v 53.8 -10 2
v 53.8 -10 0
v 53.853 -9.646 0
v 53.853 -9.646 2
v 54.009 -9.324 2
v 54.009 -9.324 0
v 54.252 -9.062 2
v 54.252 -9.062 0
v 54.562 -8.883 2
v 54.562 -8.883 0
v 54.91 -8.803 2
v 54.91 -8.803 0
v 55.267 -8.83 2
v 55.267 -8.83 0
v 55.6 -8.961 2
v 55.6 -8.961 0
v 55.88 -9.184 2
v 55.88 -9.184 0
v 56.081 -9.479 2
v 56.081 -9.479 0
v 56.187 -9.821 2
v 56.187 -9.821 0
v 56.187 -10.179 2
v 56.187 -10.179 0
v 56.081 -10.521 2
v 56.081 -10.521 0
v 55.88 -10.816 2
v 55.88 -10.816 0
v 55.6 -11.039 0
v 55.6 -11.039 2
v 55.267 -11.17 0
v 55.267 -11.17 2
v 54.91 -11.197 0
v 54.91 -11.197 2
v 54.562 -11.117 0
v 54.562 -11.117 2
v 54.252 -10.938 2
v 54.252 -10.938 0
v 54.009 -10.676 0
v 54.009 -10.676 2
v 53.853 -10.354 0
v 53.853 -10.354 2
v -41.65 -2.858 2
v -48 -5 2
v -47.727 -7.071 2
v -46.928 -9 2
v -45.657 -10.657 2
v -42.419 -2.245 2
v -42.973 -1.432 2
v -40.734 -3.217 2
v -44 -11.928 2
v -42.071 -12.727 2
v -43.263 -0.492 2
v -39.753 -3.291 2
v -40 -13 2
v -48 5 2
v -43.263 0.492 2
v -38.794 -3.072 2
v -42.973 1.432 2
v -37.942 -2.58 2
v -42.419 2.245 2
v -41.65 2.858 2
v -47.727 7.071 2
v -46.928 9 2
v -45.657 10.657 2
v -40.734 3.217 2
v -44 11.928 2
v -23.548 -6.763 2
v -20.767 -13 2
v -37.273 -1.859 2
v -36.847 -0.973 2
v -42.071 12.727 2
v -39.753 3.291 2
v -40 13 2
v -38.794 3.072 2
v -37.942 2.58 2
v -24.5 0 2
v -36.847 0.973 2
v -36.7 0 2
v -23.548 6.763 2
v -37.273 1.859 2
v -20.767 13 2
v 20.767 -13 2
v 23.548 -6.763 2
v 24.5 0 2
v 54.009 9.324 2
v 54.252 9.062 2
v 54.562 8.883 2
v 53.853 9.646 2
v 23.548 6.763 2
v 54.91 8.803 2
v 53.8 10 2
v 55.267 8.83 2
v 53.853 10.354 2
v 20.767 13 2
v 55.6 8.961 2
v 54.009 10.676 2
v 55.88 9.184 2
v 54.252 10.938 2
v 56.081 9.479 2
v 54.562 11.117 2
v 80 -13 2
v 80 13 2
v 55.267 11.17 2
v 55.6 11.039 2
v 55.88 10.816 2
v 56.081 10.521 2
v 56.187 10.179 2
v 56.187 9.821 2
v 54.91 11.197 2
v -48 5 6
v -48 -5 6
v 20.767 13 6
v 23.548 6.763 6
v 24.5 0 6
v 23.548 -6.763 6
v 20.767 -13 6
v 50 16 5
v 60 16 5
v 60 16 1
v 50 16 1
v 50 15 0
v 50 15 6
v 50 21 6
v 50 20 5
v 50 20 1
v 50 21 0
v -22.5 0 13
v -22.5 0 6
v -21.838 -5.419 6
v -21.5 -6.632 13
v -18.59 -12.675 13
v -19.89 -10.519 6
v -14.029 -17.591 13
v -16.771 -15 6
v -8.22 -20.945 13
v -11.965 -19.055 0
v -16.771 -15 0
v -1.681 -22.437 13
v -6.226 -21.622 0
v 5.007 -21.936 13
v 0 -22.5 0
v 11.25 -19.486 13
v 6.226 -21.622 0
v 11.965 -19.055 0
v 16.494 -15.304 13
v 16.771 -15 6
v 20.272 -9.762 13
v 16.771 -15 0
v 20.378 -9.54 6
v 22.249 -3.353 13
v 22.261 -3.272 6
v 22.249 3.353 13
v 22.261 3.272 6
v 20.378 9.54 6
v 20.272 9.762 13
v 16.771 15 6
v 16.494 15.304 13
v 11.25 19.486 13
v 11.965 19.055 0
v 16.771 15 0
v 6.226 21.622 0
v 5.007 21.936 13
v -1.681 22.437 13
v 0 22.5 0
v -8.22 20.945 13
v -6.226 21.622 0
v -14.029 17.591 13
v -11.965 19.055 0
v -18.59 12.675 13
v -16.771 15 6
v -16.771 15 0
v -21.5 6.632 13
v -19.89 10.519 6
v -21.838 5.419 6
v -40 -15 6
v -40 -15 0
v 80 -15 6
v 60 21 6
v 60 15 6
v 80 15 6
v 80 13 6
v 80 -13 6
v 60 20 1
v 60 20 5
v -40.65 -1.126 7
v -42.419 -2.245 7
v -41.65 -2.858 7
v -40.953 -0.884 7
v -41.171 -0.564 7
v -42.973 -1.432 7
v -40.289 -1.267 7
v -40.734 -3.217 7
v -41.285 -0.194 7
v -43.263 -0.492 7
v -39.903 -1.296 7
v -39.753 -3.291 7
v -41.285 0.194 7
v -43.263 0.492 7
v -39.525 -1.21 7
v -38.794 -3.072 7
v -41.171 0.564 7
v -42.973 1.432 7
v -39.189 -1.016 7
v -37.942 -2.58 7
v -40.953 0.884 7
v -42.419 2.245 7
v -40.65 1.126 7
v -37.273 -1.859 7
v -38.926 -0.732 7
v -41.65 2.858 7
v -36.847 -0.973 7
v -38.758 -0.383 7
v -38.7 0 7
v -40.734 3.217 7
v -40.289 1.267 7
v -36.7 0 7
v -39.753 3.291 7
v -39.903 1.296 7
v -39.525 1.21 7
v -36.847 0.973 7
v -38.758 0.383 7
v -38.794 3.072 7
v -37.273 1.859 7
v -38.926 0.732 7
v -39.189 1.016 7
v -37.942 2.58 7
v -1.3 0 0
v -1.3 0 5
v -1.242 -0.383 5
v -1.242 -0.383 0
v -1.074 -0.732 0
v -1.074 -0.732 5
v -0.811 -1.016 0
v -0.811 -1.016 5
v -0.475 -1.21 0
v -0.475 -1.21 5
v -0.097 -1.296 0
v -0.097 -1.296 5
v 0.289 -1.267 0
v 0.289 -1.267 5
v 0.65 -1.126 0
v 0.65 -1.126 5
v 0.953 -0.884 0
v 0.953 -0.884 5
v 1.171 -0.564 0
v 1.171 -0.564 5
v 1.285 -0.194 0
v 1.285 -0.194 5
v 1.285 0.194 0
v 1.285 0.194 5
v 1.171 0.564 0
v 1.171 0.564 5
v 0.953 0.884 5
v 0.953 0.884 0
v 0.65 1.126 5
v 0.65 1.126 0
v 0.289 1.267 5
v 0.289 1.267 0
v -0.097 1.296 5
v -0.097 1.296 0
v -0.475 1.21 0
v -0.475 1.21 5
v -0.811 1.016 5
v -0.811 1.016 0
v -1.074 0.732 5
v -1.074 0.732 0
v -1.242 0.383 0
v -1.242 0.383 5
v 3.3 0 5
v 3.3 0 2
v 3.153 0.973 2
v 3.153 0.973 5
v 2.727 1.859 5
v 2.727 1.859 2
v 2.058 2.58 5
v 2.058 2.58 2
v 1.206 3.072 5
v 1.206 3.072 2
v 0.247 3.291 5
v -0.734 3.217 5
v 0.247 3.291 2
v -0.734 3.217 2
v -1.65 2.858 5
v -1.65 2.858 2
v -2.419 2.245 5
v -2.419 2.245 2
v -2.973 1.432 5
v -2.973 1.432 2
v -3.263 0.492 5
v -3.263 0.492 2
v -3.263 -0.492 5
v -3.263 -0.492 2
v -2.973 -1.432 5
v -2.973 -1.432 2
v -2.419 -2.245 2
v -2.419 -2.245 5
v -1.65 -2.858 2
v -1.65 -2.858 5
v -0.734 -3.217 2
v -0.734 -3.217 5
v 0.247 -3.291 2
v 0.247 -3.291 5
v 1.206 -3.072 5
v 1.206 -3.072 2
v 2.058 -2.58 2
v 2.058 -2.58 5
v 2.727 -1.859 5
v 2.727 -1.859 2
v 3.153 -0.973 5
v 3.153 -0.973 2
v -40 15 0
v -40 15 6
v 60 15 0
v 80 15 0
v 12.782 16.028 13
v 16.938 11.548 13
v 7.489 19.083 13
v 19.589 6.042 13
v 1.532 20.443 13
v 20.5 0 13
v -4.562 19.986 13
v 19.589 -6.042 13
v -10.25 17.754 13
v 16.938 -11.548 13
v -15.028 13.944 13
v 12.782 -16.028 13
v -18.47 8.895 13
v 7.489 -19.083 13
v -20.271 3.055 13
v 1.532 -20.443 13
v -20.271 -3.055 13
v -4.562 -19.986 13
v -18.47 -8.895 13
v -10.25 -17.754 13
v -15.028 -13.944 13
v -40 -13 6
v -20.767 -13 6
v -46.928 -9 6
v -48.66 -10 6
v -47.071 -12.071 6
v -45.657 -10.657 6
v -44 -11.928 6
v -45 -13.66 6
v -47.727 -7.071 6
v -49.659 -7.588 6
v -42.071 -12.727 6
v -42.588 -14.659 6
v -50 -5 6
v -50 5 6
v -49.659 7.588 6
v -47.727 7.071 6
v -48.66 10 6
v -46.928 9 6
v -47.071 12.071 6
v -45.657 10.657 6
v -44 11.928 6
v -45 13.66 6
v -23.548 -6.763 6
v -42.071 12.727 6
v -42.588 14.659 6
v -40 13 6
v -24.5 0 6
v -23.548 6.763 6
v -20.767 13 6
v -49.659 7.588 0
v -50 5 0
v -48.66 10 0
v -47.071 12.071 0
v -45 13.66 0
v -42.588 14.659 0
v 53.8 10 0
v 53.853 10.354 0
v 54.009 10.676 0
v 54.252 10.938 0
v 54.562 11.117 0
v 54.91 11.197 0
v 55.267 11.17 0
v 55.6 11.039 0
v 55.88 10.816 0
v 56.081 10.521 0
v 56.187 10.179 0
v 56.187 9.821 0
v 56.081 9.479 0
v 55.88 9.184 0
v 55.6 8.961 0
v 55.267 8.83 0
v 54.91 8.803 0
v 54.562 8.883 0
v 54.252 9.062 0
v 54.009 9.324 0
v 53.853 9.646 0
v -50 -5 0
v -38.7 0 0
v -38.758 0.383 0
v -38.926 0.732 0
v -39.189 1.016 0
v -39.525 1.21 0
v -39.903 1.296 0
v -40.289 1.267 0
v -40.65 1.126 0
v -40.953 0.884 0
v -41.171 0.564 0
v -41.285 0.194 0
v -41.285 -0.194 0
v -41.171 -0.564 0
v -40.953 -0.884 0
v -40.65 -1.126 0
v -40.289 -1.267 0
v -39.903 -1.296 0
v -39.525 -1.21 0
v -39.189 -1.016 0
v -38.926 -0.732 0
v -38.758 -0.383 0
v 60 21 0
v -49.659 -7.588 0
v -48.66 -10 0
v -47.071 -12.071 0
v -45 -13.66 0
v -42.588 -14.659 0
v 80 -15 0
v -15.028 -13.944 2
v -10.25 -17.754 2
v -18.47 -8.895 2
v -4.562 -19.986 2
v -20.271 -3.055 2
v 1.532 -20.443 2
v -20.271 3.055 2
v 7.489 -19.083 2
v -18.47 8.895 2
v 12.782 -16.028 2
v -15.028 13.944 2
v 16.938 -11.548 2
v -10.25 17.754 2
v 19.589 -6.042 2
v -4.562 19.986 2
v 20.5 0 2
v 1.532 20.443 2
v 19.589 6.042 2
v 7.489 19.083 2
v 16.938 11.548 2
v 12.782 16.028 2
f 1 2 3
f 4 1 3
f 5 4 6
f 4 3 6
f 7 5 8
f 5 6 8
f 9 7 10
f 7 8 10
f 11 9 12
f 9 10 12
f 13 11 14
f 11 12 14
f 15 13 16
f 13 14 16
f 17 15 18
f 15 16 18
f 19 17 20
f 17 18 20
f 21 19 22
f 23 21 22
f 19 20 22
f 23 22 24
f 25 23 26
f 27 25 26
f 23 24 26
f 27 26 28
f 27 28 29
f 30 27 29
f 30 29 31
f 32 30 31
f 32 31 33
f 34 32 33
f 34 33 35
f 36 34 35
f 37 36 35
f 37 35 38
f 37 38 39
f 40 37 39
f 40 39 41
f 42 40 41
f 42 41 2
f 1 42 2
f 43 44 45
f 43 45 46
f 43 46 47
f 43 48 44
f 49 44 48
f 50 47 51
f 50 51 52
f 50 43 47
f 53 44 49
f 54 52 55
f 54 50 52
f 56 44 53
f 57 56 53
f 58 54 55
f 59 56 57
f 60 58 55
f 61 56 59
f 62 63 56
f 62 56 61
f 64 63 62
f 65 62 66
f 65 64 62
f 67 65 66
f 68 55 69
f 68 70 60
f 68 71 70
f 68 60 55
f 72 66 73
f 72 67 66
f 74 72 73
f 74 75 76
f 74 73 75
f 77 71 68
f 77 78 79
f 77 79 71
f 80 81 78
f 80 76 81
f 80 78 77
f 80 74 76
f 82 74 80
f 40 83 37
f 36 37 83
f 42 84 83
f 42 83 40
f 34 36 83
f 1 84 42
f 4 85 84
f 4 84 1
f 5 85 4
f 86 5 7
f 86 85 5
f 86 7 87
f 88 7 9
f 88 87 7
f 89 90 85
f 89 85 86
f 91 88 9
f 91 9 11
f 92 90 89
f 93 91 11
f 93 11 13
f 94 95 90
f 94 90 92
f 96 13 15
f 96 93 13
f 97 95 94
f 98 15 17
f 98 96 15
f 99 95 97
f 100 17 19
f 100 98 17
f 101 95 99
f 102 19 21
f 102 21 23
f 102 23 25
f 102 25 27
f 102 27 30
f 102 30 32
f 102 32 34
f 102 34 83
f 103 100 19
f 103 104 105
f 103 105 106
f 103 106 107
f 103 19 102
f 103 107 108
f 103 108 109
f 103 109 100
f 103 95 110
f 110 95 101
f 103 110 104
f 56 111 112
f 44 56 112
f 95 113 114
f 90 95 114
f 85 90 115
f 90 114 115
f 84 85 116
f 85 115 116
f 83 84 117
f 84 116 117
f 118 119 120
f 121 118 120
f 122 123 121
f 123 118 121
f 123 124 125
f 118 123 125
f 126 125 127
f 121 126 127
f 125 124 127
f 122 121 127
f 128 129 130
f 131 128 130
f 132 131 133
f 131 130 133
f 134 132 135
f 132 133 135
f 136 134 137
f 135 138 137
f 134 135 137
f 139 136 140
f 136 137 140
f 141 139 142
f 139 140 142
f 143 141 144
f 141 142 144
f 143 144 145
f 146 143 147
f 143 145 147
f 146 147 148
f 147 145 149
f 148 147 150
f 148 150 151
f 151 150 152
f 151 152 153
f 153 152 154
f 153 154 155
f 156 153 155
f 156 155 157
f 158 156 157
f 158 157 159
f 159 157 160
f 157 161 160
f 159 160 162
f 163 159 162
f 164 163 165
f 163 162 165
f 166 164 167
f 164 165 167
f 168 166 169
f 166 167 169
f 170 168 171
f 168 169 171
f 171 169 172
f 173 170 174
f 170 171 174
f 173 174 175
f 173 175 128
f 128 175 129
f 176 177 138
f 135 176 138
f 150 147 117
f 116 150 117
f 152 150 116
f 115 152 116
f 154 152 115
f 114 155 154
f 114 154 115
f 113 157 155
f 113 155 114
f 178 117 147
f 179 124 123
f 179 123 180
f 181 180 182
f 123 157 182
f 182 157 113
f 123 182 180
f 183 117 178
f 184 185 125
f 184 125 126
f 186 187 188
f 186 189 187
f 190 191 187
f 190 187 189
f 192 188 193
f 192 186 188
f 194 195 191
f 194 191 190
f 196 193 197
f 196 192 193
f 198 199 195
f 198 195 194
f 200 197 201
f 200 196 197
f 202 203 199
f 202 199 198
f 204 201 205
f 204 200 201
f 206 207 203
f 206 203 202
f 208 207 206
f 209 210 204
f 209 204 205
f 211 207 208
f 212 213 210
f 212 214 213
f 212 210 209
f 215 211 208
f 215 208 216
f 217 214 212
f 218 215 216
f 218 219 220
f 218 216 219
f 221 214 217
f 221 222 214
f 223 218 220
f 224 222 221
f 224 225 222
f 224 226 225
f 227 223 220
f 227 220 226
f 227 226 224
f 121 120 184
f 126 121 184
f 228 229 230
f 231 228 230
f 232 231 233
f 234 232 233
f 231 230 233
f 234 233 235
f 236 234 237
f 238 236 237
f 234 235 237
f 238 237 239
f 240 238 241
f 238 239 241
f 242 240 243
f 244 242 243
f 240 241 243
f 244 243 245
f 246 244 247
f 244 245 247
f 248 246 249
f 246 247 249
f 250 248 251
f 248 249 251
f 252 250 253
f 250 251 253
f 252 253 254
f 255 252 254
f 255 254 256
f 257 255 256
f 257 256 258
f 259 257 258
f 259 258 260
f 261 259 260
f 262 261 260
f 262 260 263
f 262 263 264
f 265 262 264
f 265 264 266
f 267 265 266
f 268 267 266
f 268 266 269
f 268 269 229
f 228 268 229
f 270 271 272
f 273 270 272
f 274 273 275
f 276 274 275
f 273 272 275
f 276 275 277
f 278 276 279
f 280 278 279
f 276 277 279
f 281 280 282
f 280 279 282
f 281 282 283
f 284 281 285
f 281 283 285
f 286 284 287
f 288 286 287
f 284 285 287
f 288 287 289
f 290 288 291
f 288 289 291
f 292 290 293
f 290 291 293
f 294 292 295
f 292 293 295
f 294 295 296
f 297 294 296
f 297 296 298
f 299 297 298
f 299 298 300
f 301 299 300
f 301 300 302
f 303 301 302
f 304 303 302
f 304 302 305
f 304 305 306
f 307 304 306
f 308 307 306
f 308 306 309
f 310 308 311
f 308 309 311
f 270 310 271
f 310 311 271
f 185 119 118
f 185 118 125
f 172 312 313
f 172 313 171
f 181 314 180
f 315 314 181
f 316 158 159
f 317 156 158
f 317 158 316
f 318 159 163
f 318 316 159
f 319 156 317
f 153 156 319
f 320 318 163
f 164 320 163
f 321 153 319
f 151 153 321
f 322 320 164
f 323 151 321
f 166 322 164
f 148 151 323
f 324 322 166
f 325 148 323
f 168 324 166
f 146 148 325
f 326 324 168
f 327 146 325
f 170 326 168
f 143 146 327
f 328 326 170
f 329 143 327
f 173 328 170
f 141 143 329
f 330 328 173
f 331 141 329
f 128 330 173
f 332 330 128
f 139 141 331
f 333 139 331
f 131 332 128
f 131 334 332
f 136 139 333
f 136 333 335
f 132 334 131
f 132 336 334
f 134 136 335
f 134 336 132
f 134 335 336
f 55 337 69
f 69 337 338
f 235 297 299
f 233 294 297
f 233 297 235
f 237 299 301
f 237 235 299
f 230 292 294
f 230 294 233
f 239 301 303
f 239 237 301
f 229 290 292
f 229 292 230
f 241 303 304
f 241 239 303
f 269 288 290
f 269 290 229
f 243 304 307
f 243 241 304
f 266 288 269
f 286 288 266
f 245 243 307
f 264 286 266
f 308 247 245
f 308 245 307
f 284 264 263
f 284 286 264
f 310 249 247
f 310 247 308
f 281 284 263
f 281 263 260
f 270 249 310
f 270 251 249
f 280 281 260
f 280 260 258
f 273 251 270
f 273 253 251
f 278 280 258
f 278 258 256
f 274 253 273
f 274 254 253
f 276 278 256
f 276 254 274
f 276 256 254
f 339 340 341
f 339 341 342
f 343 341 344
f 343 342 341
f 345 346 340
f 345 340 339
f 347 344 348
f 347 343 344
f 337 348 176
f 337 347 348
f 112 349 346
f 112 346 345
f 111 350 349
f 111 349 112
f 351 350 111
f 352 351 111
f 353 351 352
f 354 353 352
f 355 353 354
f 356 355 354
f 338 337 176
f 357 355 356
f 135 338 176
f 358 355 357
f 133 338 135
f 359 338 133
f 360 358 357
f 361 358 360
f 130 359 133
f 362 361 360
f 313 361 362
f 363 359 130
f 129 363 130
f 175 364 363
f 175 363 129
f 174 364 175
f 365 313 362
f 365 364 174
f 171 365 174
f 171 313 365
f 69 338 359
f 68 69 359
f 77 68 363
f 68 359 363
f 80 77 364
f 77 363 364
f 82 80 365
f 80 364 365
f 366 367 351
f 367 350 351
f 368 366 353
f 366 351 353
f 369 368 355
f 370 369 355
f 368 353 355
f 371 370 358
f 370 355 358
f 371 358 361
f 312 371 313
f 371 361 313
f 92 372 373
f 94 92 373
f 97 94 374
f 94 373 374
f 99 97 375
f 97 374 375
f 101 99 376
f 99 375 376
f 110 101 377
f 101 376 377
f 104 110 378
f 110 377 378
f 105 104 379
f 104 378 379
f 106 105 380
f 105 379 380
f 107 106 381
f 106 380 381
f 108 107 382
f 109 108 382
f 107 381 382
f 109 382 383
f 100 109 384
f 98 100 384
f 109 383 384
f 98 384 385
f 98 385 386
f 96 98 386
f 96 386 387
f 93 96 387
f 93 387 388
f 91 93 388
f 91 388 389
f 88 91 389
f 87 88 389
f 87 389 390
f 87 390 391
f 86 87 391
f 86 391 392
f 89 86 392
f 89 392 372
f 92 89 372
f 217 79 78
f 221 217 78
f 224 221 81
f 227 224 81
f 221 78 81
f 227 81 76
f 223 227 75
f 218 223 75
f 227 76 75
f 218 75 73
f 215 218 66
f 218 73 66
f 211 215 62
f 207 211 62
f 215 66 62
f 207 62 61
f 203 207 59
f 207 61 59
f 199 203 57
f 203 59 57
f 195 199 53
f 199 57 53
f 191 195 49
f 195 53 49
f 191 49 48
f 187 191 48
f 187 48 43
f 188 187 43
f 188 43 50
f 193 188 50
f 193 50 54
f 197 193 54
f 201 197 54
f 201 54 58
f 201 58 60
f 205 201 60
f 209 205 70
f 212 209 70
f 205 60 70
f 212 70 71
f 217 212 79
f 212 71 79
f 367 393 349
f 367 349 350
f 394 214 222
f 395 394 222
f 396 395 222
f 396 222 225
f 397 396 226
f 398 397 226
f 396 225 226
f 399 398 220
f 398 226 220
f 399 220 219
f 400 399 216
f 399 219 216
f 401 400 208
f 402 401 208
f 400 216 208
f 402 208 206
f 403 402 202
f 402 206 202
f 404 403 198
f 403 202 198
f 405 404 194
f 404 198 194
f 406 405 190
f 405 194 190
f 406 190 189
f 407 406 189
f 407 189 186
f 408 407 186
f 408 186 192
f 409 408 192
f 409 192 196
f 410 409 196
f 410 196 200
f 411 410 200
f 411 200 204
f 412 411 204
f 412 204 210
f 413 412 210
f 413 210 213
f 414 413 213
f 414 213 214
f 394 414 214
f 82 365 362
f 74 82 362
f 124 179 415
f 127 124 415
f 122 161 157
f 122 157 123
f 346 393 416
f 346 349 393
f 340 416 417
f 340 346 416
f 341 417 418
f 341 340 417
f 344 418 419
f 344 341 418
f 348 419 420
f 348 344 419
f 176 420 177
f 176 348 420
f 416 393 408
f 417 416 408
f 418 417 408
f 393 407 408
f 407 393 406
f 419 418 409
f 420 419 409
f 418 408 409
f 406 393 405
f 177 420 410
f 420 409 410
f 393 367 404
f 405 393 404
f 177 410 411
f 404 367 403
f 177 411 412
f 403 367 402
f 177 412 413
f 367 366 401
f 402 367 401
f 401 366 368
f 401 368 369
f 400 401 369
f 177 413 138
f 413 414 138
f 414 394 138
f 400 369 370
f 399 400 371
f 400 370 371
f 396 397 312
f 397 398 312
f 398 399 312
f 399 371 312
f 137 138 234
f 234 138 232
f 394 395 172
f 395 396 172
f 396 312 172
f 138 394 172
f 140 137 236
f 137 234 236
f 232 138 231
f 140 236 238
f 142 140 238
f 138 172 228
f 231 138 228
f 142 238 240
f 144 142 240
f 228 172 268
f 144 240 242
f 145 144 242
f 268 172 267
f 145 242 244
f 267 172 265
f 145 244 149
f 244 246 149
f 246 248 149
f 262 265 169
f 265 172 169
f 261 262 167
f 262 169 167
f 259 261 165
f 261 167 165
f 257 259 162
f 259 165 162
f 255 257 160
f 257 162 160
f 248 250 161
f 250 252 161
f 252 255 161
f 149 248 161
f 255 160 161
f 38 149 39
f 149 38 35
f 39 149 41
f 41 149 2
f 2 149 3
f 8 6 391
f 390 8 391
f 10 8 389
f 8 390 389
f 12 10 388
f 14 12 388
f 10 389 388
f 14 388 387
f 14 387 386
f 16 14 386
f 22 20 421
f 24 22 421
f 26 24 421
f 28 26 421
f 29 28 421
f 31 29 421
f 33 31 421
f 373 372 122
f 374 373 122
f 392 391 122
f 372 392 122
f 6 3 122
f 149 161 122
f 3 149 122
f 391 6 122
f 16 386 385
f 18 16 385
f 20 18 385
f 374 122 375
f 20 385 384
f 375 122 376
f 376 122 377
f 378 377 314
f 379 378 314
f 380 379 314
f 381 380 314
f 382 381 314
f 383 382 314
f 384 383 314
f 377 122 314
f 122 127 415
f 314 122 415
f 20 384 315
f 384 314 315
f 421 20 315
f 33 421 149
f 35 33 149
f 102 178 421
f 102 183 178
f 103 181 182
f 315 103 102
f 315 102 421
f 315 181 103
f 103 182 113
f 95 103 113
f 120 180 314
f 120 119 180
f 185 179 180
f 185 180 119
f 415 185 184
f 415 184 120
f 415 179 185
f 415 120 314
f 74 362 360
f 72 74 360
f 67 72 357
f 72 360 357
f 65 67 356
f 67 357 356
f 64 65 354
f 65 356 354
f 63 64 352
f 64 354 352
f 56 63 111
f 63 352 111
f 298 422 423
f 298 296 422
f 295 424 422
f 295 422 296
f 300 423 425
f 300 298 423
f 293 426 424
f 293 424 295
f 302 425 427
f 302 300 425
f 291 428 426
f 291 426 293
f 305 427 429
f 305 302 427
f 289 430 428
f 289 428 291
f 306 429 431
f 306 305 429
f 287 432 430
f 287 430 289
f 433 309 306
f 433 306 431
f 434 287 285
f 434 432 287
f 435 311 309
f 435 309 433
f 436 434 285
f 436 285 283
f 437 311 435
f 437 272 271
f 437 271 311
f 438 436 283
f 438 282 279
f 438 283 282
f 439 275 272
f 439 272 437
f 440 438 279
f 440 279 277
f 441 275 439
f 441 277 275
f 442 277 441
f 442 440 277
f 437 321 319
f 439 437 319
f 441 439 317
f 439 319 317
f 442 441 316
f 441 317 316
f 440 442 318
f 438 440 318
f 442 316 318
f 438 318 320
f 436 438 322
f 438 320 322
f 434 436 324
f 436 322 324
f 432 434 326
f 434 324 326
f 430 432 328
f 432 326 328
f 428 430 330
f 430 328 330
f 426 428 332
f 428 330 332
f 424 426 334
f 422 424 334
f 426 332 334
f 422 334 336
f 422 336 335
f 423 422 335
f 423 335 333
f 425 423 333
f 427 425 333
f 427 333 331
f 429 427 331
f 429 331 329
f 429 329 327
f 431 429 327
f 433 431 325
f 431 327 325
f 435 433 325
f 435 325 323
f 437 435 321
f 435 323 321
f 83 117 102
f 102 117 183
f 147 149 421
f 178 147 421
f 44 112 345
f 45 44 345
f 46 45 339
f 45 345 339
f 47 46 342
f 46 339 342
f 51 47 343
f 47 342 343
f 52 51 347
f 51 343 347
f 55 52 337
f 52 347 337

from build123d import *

# Parameters (mm, degrees)
SZKIC1_R                    = 22.5
DODANIE_WYCI_GNI_CIE2_DEPTH = 13
SZKIC2_W                    = 220
SZKIC2_H                    = 30
DODANIE_WYCI_GNI_CIE3_DEPTH = 6
ZAOKR_GLENIE1_R             = 10
SZKIC4_R                    = 20.5
WYTNIJ_WYCI_GNI_CIE3_DEPTH  = 11
WYTNIJ_WYCI_GNI_CIE2_DEPTH  = 4
WYTNIJ_WYCI_GNI_CIE4_REACH  = 173.975
SZKIC8_W                    = 23
SZKIC8_H                    = 14
SZKIC12_R                   = 3.3
DODANIE_WYCI_GNI_CIE4_DEPTH = 3
OTW_R_POD_RUB_M21_D         = 2.6
OTW_R_POD_RUB_M23_D         = 2.6
SZKIC14_R                   = 3.3
DODANIE_WYCI_GNI_CIE5_DEPTH = 5
OTW_R_POD_RUB_M24_D         = 2.6
SZKIC15_W                   = 6
SZKIC15_H                   = 6
SZKIC15_W_2                 = 4
SZKIC15_H_2                 = 4
DODANIE_WYCI_GNI_CIE6_DEPTH = 10
SZYK_LINIOWY1_COUNT         = 2
SZYK_LINIOWY1_PITCH         = 70
OTW_R_POD_RUB_M25_D         = 2.4


with BuildPart() as part:
    # Szkic1 → Dodanie-wyciągnięcie2 (new body)
    with BuildSketch(Plane.XY):
        with Locations(Location((0, 0, 0), (0, 0, 180))):
            Circle(SZKIC1_R)
    extrude(amount=DODANIE_WYCI_GNI_CIE2_DEPTH)

    # Szkic2 → Dodanie-wyciągnięcie3 (add)
    with BuildSketch(Plane.XY):
        with Locations((60, 0)):
            Rectangle(SZKIC2_W, SZKIC2_H)
    extrude(amount=DODANIE_WYCI_GNI_CIE3_DEPTH)

    # Zaokrąglenie1
    zaokr_glenie1_edges = [part.edges().sort_by_distance(p)[0] for p in [
        (170, 15, 3),
        (-50, -15, 3),
        (170, -15, 3),
        (-50, 15, 3),
    ]]
    fillet(zaokr_glenie1_edges, radius=ZAOKR_GLENIE1_R)

    # Szkic4 → Wytnij-wyciągnięcie3 (cut)
    with BuildSketch(Plane.XY.offset(13)):
        Circle(SZKIC4_R)
    extrude(amount=-WYTNIJ_WYCI_GNI_CIE3_DEPTH, mode=Mode.SUBTRACT)

    # Szkic3 → Wytnij-wyciągnięcie2 (cut)
    with BuildSketch(Plane.XY.offset(6)):
        with BuildLine():
            Line((168, -5), (168, 5))
            ThreePointArc((168, 5), (165.656854249, 10.656854249), (160, 13))
            Line((160, 13), (20.766559657, 13))
            ThreePointArc((20.766559657, 13), (24.5, 0), (20.766559657, -13))
            Line((20.766559657, -13), (160, -13))
            ThreePointArc((160, -13), (165.656854249, -10.656854249), (168, -5))
        make_face()
        with BuildLine():
            Line((-48, 5), (-48, -5))
            ThreePointArc((-48, -5), (-45.656854249, -10.656854249), (-40, -13))
            Line((-40, -13), (-20.766559657, -13))
            ThreePointArc((-20.766559657, -13), (-24.5, 0), (-20.766559657, 13))
            Line((-20.766559657, 13), (-40, 13))
            ThreePointArc((-40, 13), (-45.656854249, 10.656854249), (-48, 5))
        make_face()
    extrude(amount=-WYTNIJ_WYCI_GNI_CIE2_DEPTH, mode=Mode.SUBTRACT)

    # Szkic8 → Wytnij-wyciągnięcie4 (cut, up to next)
    with BuildSketch(Plane.XY, mode=Mode.PRIVATE) as wytnij_wyci_gni_cie4_sk1:
        with Locations((150, 0)):
            Rectangle(SZKIC8_W, SZKIC8_H)
    wytnij_wyci_gni_cie4_tool1 = extrude(wytnij_wyci_gni_cie4_sk1.sketch, amount=WYTNIJ_WYCI_GNI_CIE4_REACH, mode=Mode.PRIVATE) & part.part
    add(wytnij_wyci_gni_cie4_tool1.solids().sort_by_distance((150, 0, 0))[0], mode=Mode.SUBTRACT)

    # Szkic12 → Dodanie-wyciągnięcie4 (add)
    with BuildSketch(Plane.XY.offset(2)):
        Circle(SZKIC12_R)
    extrude(amount=DODANIE_WYCI_GNI_CIE4_DEPTH)

    # Otwór pod śrubę M21 (through all)
    with Locations(Plane(origin=(0, 0, 0), x_dir=(1, 0, 0), z_dir=(0, 0, -1))):
        with Locations((0, 0)):
            Hole(OTW_R_POD_RUB_M21_D / 2)

    # Otwór pod śrubę M23 (through all)
    with Locations(Plane(origin=(0, 0, 0), x_dir=(1, 0, 0), z_dir=(0, 0, -1))):
        with Locations((136, 0), (164, 0)):
            Hole(OTW_R_POD_RUB_M23_D / 2)

    # Szkic14 → Dodanie-wyciągnięcie5 (add)
    with BuildSketch(Plane.XY.offset(2)):
        with Locations((-40, 0)):
            Circle(SZKIC14_R)
    extrude(amount=DODANIE_WYCI_GNI_CIE5_DEPTH)

    # Otwór pod śrubę M24 (through all)
    with Locations(Plane(origin=(-40, 0, 0), x_dir=(-1, 0, 0), z_dir=(0, 0, -1))):
        with Locations((0, 0)):
            Hole(OTW_R_POD_RUB_M24_D / 2)

    # Szkic15 → Dodanie-wyciągnięcie6 (add)
    with BuildSketch(Plane(origin=(130, 0, 0), x_dir=(0, 0, -1), z_dir=(1, 0, 0))):
        with Locations((-3, 18)):
            Rectangle(SZKIC15_W, SZKIC15_H)
        with Locations((-3, 18)):
            Rectangle(SZKIC15_W_2, SZKIC15_H_2, mode=Mode.SUBTRACT)
    dodanie_wyci_gni_cie6 = extrude(amount=-DODANIE_WYCI_GNI_CIE6_DEPTH)

    # Szyk liniowy1: Dodanie-wyciągnięcie6 ×2
    with Locations(*[(-i * SZYK_LINIOWY1_PITCH, 0, 0) for i in range(1, SZYK_LINIOWY1_COUNT)]):
        add(dodanie_wyci_gni_cie6)

    # Otwór pod śrubę M25 (through all)
    with Locations(Plane.XY.offset(2)):
        with Locations((55, -10), (105, -10), (105, 10), (55, 10)):
            Hole(OTW_R_POD_RUB_M25_D / 2)

    # Cięcie powierzchnią1
    split(bisect_by=Plane(origin=(80, 0, 0), x_dir=(0, 0, -1), z_dir=(1, 0, 0)), keep=Keep.BOTTOM)


solid = part.part
